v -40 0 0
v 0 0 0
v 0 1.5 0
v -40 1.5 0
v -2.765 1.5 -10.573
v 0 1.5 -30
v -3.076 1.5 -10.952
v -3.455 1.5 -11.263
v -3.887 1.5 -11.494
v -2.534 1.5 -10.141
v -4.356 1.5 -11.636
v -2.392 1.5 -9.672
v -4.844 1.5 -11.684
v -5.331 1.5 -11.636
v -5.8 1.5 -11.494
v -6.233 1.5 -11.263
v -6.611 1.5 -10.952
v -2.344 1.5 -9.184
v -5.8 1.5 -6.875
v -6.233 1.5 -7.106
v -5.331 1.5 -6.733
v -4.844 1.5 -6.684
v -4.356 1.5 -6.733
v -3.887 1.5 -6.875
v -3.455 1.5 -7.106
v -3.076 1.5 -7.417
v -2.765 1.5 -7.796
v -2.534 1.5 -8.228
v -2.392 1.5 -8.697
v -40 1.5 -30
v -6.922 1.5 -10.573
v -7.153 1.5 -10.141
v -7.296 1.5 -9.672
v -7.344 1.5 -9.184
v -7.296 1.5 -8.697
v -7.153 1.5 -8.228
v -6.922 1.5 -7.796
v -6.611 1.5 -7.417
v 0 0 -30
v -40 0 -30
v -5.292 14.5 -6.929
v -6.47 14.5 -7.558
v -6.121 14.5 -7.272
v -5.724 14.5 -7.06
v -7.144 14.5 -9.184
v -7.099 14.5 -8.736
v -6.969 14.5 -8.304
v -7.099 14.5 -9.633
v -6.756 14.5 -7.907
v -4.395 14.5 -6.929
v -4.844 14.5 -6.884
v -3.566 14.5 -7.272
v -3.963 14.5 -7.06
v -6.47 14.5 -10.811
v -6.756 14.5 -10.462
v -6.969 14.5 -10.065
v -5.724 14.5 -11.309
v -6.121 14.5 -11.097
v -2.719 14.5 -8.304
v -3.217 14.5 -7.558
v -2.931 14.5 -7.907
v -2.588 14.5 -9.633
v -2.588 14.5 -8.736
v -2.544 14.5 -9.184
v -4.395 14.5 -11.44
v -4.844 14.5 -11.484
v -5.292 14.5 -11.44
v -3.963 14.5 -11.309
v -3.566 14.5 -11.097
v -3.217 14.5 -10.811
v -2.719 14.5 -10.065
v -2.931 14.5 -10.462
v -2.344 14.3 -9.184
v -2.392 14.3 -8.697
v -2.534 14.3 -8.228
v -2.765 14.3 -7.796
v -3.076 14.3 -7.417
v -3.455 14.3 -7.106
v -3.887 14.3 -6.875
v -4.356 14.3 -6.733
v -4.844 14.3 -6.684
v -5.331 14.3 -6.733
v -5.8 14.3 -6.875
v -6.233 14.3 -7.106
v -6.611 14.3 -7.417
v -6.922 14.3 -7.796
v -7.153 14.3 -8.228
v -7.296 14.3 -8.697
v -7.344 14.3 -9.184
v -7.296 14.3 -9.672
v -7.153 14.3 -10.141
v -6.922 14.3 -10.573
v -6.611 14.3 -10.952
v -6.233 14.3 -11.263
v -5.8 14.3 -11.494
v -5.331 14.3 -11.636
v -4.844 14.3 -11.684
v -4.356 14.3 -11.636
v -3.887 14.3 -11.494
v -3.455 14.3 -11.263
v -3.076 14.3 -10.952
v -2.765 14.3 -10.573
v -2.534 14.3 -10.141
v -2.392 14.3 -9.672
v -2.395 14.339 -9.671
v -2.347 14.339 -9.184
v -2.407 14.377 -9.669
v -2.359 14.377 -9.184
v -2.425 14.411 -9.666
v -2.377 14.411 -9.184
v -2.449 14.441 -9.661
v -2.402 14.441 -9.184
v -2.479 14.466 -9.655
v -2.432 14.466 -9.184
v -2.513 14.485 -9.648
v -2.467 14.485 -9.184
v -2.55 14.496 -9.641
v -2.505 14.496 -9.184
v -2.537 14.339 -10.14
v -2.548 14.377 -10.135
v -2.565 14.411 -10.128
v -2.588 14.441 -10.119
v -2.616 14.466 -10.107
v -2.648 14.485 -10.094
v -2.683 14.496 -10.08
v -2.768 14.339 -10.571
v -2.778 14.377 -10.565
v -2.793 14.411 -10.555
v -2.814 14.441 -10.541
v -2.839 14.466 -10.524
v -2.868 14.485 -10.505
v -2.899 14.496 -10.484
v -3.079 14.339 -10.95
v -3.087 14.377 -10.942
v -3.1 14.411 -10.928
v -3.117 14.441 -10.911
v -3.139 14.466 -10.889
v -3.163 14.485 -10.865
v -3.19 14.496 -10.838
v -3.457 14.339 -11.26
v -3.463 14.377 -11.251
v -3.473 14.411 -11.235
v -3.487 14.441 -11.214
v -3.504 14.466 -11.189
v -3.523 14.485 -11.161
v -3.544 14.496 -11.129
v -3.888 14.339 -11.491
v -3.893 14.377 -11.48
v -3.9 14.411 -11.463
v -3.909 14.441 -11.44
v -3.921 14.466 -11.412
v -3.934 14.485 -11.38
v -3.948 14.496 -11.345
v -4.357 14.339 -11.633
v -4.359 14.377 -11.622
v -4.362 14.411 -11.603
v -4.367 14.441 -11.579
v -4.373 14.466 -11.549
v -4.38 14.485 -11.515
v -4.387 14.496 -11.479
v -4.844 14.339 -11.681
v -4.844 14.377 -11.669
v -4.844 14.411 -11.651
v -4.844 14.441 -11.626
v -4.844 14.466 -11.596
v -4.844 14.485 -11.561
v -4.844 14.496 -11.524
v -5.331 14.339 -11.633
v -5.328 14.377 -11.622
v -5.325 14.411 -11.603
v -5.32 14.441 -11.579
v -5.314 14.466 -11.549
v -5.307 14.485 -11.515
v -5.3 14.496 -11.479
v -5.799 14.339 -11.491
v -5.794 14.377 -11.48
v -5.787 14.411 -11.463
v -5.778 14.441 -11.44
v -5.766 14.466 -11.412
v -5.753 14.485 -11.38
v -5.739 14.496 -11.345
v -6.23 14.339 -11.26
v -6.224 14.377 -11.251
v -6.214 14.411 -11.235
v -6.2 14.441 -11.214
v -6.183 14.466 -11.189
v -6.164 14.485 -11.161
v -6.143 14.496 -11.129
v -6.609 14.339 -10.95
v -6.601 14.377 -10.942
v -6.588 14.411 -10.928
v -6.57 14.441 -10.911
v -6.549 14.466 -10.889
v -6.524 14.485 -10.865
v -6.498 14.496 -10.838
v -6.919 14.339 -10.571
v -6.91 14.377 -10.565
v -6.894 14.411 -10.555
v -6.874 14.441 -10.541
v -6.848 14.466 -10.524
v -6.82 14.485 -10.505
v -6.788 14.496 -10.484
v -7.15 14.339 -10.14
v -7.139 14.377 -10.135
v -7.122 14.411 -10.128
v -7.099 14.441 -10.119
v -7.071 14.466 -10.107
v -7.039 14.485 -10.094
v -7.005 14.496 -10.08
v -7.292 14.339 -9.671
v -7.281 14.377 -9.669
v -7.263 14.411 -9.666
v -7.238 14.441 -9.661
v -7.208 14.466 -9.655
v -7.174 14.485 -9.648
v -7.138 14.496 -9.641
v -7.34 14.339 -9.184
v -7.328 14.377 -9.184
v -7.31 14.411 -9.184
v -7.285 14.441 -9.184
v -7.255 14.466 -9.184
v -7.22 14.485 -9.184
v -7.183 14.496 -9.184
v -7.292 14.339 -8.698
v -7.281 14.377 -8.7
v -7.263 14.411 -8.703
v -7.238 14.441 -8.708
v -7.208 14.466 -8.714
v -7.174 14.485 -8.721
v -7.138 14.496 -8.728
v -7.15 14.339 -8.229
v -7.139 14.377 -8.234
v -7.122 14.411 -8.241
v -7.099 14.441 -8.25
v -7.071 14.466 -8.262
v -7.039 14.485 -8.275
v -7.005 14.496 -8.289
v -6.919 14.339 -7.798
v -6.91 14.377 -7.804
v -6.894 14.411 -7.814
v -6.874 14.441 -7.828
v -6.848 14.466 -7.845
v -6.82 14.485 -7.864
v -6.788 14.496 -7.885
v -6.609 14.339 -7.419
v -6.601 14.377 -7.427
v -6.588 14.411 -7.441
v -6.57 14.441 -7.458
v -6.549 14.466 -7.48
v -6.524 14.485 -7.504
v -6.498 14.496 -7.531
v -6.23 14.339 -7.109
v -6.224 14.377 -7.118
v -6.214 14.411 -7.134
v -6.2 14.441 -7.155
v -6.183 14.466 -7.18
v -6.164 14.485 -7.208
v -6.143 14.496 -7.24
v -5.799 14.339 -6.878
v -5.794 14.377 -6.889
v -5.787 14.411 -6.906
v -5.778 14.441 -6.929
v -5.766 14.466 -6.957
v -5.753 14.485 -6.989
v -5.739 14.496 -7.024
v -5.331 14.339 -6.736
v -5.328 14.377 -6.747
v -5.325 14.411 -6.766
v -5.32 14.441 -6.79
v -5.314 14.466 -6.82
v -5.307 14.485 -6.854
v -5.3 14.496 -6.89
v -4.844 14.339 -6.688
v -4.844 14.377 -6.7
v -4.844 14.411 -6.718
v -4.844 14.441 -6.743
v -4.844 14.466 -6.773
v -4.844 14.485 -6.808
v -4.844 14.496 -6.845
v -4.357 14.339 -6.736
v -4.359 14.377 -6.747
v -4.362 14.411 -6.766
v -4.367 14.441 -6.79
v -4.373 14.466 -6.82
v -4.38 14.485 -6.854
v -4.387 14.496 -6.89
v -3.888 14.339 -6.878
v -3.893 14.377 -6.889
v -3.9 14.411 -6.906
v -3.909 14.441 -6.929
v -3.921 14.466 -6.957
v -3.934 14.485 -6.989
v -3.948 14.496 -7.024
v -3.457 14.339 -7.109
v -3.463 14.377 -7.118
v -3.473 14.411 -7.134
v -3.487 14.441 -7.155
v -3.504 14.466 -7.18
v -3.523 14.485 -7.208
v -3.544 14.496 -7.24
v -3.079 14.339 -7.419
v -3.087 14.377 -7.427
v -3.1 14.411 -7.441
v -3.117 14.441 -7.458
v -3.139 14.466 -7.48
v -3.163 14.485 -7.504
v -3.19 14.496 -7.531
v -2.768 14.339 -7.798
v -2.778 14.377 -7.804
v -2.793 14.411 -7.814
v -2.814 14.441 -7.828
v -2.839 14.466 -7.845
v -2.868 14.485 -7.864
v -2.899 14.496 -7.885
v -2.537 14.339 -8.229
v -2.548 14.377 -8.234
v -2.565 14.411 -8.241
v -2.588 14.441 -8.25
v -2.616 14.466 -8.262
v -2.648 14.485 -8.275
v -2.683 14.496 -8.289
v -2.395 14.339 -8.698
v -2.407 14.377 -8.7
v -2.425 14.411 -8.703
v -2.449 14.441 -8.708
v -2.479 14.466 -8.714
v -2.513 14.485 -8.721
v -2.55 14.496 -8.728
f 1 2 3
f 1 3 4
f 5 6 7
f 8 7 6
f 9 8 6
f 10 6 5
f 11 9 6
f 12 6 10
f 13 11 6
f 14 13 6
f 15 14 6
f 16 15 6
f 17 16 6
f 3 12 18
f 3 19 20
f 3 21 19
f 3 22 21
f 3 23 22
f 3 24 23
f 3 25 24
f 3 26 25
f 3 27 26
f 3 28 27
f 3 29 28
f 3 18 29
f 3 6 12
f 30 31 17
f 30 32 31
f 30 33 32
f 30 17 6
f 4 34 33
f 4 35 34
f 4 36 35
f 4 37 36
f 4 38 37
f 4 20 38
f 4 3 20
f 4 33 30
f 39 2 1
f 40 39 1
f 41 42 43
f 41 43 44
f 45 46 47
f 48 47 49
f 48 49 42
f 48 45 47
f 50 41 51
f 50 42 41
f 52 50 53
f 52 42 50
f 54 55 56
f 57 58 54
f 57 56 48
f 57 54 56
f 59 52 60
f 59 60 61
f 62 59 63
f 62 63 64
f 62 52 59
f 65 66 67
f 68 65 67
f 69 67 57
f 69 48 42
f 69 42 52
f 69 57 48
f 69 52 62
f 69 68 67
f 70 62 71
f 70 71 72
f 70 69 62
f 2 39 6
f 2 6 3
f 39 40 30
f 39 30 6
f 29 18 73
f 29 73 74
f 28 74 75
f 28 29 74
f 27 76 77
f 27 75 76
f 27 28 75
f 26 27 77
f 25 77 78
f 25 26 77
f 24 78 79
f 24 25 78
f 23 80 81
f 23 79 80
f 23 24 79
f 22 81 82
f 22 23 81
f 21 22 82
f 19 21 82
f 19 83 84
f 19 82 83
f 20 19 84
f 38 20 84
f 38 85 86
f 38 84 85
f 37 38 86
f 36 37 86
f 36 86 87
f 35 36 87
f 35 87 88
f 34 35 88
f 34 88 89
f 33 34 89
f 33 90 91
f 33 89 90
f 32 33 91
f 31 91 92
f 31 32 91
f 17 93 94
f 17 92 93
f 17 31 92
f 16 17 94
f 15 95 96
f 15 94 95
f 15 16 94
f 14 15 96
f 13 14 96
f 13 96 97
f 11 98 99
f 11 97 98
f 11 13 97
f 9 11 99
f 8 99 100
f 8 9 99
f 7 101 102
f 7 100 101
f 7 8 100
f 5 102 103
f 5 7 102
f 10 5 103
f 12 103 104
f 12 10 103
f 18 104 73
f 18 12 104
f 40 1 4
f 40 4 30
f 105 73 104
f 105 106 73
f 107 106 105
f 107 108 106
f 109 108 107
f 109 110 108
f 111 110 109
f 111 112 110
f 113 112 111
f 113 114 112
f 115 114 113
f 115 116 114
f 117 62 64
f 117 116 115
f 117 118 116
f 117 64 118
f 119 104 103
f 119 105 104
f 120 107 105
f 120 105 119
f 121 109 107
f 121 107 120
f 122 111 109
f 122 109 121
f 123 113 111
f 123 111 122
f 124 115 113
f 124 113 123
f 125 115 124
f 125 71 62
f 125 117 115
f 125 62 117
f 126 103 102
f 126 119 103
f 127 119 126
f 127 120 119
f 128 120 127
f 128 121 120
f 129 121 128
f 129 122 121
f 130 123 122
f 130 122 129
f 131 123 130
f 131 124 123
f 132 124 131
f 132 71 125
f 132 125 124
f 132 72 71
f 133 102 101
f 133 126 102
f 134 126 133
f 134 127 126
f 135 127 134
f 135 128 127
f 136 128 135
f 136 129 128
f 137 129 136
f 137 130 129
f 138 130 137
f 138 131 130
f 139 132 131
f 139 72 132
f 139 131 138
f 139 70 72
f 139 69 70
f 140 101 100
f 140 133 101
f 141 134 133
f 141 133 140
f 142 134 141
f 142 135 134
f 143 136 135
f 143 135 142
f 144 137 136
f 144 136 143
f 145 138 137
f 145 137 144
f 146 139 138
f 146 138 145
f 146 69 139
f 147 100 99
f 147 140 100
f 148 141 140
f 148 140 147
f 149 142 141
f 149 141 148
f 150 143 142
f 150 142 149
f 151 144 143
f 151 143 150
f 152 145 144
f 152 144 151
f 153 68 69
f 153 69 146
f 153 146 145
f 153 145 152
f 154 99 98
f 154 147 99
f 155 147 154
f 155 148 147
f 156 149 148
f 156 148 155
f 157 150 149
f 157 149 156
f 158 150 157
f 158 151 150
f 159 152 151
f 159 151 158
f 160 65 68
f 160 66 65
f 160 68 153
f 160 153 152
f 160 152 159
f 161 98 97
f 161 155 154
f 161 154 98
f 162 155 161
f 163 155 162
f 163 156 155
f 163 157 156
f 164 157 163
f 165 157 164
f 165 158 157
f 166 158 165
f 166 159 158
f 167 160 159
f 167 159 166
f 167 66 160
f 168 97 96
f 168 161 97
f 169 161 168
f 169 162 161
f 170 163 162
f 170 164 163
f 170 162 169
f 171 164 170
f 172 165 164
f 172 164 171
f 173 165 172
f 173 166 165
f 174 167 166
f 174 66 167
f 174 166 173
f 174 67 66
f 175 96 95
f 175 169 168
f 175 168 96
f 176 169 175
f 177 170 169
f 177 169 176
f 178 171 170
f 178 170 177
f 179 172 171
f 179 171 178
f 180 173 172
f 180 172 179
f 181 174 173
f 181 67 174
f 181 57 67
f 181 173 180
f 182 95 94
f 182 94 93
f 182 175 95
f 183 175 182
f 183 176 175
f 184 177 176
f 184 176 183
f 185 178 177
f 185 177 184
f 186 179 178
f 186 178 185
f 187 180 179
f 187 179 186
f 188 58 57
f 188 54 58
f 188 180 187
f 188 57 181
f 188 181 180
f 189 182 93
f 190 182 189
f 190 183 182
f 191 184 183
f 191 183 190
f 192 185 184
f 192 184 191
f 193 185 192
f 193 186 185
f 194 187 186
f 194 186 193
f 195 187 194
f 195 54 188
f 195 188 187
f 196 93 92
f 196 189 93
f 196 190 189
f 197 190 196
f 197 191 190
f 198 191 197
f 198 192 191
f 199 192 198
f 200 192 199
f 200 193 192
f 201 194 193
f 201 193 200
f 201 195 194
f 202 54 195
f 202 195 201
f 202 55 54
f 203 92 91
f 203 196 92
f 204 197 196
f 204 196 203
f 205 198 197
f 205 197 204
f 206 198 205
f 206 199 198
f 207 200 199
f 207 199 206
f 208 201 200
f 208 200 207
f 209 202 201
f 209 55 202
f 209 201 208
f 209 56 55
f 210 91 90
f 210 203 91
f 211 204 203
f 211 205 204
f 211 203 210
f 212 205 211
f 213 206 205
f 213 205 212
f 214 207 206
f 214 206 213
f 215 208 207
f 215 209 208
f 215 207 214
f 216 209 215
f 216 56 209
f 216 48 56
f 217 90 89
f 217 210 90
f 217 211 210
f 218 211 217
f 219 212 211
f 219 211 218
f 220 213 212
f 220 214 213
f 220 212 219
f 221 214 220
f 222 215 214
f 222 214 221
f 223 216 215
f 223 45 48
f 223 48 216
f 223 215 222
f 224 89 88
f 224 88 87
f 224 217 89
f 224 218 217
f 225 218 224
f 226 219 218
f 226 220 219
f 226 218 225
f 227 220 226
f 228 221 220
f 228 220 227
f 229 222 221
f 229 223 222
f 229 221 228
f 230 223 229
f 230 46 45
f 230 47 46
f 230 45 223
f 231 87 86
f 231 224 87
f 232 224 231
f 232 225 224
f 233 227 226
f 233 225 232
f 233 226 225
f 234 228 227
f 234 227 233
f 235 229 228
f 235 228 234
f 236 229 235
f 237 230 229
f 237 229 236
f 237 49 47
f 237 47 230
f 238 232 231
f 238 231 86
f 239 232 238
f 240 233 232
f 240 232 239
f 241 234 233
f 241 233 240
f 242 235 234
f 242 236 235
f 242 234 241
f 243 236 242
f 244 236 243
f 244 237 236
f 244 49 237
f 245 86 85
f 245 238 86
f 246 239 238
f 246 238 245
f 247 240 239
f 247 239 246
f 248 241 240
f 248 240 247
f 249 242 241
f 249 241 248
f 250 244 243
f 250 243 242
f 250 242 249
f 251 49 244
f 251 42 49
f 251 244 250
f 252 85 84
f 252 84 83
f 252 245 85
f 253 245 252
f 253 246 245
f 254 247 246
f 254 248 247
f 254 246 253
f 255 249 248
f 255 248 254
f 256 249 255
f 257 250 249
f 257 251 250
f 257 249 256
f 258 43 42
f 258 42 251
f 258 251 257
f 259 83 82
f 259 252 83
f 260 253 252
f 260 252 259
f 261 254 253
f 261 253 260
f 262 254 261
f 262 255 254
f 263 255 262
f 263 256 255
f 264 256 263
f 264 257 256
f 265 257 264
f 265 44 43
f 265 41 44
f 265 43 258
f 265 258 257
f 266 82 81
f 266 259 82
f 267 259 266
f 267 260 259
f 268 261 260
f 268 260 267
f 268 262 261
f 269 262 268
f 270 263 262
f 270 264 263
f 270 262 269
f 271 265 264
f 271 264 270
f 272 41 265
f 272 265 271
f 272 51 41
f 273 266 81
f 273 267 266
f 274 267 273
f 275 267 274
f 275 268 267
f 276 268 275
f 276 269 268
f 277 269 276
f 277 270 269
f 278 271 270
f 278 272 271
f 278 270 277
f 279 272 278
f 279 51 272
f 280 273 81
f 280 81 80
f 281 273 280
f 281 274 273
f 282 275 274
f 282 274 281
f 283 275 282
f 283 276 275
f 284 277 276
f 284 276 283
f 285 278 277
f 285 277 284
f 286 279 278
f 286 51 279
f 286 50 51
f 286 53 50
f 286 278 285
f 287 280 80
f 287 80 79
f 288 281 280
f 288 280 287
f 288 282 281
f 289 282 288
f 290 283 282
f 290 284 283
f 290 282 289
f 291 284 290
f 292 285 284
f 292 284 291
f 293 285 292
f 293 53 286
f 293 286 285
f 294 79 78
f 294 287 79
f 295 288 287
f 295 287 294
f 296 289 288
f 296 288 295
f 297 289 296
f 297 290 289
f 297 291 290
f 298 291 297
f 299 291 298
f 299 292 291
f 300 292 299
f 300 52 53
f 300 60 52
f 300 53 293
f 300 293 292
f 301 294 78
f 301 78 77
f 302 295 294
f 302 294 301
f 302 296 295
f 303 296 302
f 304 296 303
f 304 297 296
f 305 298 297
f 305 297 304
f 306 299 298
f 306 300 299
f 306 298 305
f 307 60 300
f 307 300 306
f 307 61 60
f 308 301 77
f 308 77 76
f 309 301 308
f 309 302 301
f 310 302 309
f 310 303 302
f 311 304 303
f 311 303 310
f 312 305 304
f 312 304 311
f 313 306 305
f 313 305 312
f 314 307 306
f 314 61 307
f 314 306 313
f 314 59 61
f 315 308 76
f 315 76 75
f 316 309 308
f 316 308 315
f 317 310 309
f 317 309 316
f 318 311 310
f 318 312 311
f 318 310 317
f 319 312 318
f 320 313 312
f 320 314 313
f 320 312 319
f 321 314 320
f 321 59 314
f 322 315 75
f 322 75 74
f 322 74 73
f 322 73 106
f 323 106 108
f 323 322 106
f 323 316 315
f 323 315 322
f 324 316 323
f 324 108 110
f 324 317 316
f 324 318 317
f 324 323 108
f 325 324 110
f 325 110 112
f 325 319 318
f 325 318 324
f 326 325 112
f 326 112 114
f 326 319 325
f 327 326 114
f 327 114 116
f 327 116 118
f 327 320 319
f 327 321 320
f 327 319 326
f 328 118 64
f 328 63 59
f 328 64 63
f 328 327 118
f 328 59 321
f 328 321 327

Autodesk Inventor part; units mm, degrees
ref_plane "YZ Plane" through (0, 0, 0) normal (1, 0, 0) x (0, 1, 0)
ref_plane "XZ Plane" through (0, 0, 0) normal (0, 1, 0) x (-1, 0, 0)
ref_plane "XY Plane" through (0, 0, 0) normal (0, 0, 1) x (1, 0, 0)
sketch "Sketch1" plane through (0, 0, 0) normal (0, 1, 0) x (-1, 0, 0)
  line L0 (0, 0) -> (40, 0)
  line L1 (40, 0) -> (40, -30)
  line L2 (40, -30) -> (0, -30)
  line L3 (0, -30) -> (0, 0)
  dimension "d0" = 40
  dimension "d1" = 30
extrude "Extrusion1" add sketch "Sketch1" along normal blind 1.5
sketch "Sketch2" plane through (0, 1.5, 0) normal (0, 1, 0) x (1, 0, 0)
  circle A0 centre (-4.8436, 9.1845) radius 2.5
  point P0 (0, 0)
  dimension "d4" = 5
extrude "Extrusion2" add sketch "Sketch2" along normal blind 13
fillet "Fillet1" radius 0.2 1 edges at (-7.3436, 14.5, -9.1845)
properties part number "Circuit_Board"
